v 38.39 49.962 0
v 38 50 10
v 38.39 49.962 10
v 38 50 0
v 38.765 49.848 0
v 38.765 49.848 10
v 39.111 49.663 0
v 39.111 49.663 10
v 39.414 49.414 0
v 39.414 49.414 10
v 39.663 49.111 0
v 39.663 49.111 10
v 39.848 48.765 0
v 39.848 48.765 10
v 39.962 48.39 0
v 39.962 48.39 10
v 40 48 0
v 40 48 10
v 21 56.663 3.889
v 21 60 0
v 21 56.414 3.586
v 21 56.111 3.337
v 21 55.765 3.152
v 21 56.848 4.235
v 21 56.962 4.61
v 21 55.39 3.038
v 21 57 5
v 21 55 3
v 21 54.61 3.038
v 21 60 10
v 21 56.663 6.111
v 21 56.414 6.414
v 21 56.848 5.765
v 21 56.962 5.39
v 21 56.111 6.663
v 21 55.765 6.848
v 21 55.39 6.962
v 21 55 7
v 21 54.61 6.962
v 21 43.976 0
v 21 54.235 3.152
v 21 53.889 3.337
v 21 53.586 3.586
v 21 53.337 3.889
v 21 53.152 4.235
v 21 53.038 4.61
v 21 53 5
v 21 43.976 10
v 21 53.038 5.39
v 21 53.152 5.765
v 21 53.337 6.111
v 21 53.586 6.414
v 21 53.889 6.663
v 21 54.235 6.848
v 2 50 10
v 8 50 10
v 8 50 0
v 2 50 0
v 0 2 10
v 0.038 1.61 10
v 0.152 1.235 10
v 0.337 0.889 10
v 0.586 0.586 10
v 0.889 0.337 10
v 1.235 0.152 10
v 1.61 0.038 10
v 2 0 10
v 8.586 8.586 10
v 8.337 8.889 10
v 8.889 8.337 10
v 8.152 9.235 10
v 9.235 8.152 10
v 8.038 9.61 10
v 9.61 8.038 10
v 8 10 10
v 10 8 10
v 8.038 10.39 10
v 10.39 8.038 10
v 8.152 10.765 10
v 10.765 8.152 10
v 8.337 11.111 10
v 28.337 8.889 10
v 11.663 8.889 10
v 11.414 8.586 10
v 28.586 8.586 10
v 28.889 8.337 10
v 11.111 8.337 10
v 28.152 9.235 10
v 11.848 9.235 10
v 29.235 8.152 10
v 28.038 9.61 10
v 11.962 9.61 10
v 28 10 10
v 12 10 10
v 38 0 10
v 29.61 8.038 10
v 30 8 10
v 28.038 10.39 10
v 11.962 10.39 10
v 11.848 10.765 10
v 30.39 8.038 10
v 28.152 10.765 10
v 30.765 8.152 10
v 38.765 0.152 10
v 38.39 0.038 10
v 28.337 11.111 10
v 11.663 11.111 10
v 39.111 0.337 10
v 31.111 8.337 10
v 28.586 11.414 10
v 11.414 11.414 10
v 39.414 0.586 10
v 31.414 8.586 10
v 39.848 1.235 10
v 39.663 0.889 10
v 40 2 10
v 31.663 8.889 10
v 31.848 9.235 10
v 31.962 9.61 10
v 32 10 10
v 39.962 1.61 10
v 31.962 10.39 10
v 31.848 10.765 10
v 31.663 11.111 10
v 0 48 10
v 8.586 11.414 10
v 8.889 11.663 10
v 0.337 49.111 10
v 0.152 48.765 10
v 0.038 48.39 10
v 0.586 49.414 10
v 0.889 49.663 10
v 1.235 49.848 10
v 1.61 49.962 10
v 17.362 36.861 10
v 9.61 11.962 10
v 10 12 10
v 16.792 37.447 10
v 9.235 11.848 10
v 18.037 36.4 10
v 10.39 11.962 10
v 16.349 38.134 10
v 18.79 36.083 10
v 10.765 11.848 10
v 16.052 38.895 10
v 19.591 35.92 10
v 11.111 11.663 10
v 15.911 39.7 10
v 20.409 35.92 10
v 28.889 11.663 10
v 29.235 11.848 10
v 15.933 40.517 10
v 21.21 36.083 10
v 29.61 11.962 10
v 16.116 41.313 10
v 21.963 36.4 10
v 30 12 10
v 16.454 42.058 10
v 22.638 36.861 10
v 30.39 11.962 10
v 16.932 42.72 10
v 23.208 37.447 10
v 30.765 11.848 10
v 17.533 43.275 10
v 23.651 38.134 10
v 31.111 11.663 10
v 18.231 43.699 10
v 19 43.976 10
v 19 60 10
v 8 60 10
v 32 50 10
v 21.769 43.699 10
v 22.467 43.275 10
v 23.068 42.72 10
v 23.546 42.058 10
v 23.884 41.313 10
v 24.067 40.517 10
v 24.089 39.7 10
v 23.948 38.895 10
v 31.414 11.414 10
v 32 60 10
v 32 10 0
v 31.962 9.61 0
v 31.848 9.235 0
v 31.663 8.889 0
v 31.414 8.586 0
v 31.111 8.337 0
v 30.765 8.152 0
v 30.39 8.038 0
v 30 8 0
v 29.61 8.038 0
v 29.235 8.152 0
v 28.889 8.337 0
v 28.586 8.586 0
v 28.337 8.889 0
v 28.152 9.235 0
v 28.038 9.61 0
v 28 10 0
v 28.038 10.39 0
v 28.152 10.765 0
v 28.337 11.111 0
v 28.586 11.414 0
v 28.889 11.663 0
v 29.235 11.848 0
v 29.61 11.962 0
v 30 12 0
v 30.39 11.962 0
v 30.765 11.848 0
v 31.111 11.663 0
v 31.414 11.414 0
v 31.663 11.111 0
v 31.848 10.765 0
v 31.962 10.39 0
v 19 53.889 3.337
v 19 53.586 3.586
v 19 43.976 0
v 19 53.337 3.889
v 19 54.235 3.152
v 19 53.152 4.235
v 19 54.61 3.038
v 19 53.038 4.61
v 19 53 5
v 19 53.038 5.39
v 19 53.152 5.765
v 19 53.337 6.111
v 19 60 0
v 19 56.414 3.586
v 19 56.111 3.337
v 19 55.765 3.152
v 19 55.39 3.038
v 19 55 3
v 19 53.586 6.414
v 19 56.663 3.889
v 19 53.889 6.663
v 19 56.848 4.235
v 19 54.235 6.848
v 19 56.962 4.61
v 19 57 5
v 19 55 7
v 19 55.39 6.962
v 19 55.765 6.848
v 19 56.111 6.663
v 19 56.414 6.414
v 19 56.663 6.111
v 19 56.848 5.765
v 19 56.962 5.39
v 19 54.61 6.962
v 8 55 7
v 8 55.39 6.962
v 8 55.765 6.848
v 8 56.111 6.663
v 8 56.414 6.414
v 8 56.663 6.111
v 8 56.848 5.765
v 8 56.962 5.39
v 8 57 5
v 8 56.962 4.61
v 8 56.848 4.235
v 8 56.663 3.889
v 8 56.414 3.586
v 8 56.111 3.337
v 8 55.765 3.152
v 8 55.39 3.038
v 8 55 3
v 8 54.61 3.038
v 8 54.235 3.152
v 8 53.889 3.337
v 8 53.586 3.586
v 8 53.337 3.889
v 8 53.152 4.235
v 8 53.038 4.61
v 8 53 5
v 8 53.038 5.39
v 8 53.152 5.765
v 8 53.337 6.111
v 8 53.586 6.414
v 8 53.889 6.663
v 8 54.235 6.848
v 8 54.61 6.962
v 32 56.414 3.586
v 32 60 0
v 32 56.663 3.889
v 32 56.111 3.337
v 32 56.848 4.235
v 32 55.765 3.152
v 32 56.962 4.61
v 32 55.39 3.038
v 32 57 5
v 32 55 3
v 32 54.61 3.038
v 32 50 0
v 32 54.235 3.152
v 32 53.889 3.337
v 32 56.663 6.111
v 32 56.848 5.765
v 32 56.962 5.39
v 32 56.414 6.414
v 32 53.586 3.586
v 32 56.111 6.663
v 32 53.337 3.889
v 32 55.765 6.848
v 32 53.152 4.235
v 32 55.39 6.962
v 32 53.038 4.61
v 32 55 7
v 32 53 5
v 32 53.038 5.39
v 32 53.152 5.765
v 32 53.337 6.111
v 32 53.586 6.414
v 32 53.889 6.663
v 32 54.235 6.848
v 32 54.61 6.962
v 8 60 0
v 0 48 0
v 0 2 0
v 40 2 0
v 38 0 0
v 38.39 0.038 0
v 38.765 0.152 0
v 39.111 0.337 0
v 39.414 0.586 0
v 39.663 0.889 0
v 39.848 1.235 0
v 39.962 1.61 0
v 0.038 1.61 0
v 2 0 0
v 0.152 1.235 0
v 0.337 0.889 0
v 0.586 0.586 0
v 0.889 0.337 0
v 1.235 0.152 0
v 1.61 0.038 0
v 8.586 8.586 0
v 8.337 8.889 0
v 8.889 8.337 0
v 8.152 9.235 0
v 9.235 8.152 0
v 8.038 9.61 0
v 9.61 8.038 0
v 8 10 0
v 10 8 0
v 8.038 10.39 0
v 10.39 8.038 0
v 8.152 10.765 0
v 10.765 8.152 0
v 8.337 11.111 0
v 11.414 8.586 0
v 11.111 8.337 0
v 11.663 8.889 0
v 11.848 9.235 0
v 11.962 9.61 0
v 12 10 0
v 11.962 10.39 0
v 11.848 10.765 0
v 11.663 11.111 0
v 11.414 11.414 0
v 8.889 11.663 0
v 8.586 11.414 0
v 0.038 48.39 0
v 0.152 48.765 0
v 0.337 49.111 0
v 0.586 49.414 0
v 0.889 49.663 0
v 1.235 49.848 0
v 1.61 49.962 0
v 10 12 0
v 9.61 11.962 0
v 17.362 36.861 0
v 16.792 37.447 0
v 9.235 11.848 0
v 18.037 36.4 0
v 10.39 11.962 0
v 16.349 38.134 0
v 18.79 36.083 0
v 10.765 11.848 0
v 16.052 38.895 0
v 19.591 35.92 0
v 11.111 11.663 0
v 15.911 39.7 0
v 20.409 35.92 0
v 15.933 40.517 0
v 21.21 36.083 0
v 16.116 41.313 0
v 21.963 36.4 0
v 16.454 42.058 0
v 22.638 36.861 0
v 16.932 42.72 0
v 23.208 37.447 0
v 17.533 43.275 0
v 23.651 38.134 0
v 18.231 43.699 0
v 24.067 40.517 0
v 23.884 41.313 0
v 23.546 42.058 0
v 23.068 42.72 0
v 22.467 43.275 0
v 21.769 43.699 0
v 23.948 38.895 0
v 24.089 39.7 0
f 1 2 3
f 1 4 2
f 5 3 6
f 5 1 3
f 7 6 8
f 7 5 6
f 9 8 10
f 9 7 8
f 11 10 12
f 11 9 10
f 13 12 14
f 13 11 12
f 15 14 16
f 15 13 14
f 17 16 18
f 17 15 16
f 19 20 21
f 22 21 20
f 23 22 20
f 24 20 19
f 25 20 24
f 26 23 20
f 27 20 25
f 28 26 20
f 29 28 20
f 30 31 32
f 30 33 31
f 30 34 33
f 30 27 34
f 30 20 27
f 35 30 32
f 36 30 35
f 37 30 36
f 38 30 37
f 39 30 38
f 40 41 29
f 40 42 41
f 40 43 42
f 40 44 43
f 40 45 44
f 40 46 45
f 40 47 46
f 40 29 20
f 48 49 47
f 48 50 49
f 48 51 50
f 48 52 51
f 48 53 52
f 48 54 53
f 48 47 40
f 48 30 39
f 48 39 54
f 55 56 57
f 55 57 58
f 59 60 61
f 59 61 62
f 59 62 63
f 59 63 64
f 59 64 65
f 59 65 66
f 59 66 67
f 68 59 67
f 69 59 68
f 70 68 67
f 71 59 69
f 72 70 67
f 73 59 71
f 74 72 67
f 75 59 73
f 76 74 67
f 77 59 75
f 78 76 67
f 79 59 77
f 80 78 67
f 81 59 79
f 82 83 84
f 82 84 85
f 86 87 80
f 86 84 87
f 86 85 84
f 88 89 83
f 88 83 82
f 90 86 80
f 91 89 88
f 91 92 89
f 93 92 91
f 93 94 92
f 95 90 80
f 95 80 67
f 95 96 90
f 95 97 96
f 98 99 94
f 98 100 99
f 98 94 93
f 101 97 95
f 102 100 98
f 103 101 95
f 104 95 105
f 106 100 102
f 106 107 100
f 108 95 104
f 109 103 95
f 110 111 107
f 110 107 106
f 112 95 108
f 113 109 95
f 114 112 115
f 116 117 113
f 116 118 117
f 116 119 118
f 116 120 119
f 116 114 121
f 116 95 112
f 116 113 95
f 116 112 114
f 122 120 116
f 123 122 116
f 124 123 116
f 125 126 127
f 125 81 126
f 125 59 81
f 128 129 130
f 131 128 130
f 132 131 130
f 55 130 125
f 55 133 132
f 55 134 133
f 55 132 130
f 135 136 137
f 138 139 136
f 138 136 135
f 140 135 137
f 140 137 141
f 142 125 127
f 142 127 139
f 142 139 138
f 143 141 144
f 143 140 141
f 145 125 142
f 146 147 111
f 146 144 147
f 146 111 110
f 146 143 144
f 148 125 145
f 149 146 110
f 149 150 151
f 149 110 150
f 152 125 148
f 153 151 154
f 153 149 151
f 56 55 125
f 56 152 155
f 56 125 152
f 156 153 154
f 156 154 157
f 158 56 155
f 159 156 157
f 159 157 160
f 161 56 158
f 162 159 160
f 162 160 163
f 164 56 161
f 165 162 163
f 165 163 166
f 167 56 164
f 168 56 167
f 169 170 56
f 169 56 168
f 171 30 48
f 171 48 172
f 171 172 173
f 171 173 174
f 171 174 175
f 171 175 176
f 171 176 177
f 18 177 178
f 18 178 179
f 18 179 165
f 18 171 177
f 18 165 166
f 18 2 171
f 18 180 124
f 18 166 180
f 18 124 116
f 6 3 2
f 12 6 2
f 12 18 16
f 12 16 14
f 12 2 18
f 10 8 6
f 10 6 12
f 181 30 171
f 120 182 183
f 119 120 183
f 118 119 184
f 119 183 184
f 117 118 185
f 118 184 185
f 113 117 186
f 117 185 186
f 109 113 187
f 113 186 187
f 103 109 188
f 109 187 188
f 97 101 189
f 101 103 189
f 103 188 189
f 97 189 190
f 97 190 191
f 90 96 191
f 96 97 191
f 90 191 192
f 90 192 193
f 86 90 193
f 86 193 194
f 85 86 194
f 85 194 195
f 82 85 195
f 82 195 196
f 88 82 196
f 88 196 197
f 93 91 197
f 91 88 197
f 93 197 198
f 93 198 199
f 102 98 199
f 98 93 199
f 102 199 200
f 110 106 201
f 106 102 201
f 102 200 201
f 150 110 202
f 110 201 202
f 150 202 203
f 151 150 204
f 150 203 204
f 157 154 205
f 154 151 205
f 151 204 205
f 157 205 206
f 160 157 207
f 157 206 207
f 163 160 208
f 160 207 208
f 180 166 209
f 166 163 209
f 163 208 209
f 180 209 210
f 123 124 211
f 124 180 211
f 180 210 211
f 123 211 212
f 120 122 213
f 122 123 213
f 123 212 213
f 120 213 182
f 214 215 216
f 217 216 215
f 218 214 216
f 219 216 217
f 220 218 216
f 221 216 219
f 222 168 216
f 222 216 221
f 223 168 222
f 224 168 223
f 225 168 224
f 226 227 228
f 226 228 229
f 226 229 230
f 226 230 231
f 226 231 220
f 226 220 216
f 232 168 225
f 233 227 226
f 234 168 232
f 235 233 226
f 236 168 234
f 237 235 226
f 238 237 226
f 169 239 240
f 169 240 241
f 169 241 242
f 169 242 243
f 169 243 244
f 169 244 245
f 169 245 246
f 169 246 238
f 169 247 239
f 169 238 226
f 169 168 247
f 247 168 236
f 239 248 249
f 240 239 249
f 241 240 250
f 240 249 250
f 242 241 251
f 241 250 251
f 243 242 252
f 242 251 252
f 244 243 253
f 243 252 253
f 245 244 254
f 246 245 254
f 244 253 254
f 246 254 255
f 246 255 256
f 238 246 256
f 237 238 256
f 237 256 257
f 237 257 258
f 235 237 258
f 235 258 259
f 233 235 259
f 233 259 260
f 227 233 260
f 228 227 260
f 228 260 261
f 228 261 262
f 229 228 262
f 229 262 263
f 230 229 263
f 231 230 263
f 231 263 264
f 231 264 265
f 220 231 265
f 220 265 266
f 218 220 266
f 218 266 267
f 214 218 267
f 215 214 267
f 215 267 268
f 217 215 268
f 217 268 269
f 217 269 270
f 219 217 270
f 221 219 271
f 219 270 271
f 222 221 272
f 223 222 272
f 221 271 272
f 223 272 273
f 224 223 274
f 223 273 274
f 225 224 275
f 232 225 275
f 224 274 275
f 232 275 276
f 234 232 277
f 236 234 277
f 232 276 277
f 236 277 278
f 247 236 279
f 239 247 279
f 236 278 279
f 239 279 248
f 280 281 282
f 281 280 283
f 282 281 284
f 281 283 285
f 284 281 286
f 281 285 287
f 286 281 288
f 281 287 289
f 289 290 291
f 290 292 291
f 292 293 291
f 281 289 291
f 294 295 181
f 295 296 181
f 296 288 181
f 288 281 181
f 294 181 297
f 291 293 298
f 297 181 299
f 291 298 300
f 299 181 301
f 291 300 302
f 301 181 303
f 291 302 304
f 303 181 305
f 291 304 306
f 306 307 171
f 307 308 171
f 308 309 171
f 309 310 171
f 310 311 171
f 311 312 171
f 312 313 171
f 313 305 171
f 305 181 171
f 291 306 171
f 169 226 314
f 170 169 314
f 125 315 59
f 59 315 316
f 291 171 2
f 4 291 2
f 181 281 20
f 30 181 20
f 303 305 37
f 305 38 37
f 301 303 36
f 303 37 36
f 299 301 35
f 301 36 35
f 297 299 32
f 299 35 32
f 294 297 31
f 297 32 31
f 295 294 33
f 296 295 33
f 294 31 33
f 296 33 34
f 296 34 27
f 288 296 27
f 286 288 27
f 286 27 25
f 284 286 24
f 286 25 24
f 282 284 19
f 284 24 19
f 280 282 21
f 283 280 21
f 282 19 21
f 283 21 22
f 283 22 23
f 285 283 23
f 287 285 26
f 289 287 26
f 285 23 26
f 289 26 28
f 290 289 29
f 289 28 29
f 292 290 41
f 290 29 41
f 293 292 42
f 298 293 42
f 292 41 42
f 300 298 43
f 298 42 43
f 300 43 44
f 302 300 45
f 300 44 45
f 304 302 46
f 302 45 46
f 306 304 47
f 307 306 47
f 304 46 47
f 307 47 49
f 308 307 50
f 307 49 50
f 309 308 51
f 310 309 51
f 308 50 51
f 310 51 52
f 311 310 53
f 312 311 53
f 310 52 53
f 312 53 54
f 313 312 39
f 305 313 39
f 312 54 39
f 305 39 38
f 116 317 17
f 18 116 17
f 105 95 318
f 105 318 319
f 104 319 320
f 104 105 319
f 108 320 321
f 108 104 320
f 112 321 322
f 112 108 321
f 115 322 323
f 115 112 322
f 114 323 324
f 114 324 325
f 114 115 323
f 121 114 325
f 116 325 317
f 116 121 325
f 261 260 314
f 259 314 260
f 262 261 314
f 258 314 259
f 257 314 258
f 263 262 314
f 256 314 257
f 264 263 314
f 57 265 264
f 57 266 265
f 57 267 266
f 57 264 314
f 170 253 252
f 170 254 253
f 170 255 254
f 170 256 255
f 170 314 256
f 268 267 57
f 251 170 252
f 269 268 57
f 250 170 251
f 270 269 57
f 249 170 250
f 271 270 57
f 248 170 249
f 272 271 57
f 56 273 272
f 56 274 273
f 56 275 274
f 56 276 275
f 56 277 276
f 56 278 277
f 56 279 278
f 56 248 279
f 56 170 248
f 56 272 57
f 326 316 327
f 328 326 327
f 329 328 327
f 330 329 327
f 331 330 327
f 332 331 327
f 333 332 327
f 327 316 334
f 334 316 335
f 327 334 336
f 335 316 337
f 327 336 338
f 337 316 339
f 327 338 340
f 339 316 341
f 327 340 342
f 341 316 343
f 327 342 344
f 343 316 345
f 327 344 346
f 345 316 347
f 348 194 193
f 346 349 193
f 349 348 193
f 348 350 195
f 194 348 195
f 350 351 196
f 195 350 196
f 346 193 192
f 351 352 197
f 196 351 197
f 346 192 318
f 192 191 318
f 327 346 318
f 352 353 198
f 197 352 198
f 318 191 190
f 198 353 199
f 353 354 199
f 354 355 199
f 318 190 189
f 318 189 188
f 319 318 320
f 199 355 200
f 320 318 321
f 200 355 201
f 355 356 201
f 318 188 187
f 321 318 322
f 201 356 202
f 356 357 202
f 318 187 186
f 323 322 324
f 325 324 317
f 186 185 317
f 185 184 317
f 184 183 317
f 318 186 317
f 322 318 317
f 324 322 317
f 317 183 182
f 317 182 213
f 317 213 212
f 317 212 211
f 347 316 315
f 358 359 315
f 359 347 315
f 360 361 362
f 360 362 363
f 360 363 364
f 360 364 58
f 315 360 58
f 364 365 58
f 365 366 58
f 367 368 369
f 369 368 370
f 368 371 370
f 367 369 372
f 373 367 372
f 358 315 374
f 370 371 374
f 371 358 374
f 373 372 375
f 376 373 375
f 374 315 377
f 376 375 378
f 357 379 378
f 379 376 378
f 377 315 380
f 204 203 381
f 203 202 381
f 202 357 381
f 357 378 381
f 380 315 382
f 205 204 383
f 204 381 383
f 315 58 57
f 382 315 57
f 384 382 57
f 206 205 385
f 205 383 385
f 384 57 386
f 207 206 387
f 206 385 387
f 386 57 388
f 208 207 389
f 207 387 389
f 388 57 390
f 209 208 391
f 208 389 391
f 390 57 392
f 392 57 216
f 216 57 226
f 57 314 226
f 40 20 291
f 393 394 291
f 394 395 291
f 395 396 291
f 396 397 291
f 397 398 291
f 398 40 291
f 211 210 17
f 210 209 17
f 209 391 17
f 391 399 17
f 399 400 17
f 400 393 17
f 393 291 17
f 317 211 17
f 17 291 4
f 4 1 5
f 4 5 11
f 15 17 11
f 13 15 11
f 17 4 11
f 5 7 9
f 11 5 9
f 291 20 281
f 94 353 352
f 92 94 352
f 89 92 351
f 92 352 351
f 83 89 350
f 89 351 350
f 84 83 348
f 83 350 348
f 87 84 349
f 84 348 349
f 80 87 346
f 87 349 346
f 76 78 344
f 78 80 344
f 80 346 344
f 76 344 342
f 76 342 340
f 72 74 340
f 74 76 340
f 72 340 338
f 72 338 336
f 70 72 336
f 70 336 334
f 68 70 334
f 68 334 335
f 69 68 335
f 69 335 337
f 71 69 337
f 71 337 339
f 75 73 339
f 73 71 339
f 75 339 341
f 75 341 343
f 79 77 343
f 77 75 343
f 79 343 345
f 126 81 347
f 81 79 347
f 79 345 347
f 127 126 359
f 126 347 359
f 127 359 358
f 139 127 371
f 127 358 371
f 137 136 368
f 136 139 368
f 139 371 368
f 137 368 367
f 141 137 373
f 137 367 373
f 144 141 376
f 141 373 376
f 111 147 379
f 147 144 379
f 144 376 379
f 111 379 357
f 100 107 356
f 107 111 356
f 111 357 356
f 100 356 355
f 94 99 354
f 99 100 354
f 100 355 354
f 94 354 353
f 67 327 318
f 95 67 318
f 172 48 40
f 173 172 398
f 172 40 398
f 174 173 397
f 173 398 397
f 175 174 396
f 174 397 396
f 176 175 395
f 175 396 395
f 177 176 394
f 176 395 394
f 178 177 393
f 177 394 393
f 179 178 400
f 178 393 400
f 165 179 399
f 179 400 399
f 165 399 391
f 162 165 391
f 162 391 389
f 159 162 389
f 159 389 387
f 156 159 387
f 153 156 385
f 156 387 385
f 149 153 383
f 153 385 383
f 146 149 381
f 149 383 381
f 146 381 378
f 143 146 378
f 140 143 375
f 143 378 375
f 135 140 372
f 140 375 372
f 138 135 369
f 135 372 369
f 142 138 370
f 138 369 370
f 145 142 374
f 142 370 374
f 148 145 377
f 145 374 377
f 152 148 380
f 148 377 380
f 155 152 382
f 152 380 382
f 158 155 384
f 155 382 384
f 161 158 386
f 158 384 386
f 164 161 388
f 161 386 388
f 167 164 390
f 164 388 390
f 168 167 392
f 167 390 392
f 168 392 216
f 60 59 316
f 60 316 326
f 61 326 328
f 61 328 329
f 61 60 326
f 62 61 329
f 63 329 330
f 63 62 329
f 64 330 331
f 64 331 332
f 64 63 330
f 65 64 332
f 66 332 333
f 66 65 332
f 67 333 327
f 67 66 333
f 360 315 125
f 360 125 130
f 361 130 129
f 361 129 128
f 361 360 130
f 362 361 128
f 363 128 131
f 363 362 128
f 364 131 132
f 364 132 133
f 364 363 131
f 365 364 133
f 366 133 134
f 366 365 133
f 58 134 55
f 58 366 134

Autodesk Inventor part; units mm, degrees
ref_plane "YZ Plane" through (0, 0, 0) normal (1, 0, 0) x (0, 1, 0)
ref_plane "XZ Plane" through (0, 0, 0) normal (0, 1, 0) x (-1, 0, 0)
ref_plane "XY Plane" through (0, 0, 0) normal (0, 0, 1) x (1, 0, 0)
sketch "スケッチ1" plane through (0, 0, 0) normal (0, 0, 1) x (1, 0, 0)
  line L0 (0, 0) -> (40, 0)
  line L1 (40, 0) -> (40, 60)
  line L2 (40, 60) -> (0, 60)
  line L3 (0, 60) -> (0, 0)
  line L4 (0, 10) -> (40, 10) construction
  circle A0 centre (10, 10) radius 2
  circle A1 centre (30, 10) radius 2
  line L5 (20, 60) -> (20, 40) construction
  circle A2 centre (20, 40) radius 4.1
  dimension "d0" = 10
  dimension "d1" = 10
  dimension "d2" = 10
  dimension "d3" = 40
  dimension "d4" = 4
  dimension "d5" = 8.2
  dimension "d6" = 40
  dimension "d7" = 20
extrude "押し出し1" add sketch "スケッチ1" along normal blind 10
sketch "スケッチ2" plane through (0, 0, 10) normal (0, 0, 1) x (1, 0, 0)
  line L0 (40, 60) -> (0, 60) construction
  line L1 (20, 60) -> (20, 0) construction
  line L2 (0, 0) -> (40, 0) construction
  line L3 (0, 60) -> (8, 60)
  line L4 (8, 60) -> (8, 50)
  line L5 (8, 50) -> (0, 50)
  line L6 (0, 50) -> (0, 60)
  line L7 (40, 0) -> (40, 60) projected
  line L8 (40, 60) -> (32, 60)
  line L9 (32, 60) -> (32, 50)
  line L10 (32, 50) -> (40, 50)
  line L11 (40, 50) -> (40, 60)
  line L12 (19, 80) -> (21, 80)
  line L13 (21, 80) -> (21, 40)
  line L14 (21, 40) -> (19, 40)
  line L15 (19, 40) -> (19, 80)
  line L16 (19, 80) -> (21, 40) construction
  line L17 (21, 80) -> (19, 40) construction
  circle A0 centre (20, 40) radius 4.1 projected
  dimension "d11" = 10
  dimension "d12" = 8
  dimension "d13" = 2
extrude "押し出し2" cut sketch "スケッチ2" against normal blind 10 contours L3 L4 L5 L6 | L10 L9 L8 L7 | L12 L13 A0 L15 | A0 L13 L14 L15 picked at (19.8879, 41.3621)
sketch "スケッチ3" plane through (0, 0, 0) normal (-1, 0, 0) x (0, 0, 1)
  line L0 (0, 0) -> (10, 0) construction
  line L1 (5, 0) -> (5, 59.7235) construction
  circle A0 centre (5, 55) radius 2
  line L2 (10, 60) -> (0, 60) construction
  dimension "d16" = 5
  dimension "d17" = 4
extrude "押し出し3" cut sketch "スケッチ3" against normal through all
fillet "フィレット1" radius 2 4 edges at (0, 0, 5) (40, 0, 5) (40, 50, 5) (0, 50, 5)
properties part number "ガイド輪マウント"
